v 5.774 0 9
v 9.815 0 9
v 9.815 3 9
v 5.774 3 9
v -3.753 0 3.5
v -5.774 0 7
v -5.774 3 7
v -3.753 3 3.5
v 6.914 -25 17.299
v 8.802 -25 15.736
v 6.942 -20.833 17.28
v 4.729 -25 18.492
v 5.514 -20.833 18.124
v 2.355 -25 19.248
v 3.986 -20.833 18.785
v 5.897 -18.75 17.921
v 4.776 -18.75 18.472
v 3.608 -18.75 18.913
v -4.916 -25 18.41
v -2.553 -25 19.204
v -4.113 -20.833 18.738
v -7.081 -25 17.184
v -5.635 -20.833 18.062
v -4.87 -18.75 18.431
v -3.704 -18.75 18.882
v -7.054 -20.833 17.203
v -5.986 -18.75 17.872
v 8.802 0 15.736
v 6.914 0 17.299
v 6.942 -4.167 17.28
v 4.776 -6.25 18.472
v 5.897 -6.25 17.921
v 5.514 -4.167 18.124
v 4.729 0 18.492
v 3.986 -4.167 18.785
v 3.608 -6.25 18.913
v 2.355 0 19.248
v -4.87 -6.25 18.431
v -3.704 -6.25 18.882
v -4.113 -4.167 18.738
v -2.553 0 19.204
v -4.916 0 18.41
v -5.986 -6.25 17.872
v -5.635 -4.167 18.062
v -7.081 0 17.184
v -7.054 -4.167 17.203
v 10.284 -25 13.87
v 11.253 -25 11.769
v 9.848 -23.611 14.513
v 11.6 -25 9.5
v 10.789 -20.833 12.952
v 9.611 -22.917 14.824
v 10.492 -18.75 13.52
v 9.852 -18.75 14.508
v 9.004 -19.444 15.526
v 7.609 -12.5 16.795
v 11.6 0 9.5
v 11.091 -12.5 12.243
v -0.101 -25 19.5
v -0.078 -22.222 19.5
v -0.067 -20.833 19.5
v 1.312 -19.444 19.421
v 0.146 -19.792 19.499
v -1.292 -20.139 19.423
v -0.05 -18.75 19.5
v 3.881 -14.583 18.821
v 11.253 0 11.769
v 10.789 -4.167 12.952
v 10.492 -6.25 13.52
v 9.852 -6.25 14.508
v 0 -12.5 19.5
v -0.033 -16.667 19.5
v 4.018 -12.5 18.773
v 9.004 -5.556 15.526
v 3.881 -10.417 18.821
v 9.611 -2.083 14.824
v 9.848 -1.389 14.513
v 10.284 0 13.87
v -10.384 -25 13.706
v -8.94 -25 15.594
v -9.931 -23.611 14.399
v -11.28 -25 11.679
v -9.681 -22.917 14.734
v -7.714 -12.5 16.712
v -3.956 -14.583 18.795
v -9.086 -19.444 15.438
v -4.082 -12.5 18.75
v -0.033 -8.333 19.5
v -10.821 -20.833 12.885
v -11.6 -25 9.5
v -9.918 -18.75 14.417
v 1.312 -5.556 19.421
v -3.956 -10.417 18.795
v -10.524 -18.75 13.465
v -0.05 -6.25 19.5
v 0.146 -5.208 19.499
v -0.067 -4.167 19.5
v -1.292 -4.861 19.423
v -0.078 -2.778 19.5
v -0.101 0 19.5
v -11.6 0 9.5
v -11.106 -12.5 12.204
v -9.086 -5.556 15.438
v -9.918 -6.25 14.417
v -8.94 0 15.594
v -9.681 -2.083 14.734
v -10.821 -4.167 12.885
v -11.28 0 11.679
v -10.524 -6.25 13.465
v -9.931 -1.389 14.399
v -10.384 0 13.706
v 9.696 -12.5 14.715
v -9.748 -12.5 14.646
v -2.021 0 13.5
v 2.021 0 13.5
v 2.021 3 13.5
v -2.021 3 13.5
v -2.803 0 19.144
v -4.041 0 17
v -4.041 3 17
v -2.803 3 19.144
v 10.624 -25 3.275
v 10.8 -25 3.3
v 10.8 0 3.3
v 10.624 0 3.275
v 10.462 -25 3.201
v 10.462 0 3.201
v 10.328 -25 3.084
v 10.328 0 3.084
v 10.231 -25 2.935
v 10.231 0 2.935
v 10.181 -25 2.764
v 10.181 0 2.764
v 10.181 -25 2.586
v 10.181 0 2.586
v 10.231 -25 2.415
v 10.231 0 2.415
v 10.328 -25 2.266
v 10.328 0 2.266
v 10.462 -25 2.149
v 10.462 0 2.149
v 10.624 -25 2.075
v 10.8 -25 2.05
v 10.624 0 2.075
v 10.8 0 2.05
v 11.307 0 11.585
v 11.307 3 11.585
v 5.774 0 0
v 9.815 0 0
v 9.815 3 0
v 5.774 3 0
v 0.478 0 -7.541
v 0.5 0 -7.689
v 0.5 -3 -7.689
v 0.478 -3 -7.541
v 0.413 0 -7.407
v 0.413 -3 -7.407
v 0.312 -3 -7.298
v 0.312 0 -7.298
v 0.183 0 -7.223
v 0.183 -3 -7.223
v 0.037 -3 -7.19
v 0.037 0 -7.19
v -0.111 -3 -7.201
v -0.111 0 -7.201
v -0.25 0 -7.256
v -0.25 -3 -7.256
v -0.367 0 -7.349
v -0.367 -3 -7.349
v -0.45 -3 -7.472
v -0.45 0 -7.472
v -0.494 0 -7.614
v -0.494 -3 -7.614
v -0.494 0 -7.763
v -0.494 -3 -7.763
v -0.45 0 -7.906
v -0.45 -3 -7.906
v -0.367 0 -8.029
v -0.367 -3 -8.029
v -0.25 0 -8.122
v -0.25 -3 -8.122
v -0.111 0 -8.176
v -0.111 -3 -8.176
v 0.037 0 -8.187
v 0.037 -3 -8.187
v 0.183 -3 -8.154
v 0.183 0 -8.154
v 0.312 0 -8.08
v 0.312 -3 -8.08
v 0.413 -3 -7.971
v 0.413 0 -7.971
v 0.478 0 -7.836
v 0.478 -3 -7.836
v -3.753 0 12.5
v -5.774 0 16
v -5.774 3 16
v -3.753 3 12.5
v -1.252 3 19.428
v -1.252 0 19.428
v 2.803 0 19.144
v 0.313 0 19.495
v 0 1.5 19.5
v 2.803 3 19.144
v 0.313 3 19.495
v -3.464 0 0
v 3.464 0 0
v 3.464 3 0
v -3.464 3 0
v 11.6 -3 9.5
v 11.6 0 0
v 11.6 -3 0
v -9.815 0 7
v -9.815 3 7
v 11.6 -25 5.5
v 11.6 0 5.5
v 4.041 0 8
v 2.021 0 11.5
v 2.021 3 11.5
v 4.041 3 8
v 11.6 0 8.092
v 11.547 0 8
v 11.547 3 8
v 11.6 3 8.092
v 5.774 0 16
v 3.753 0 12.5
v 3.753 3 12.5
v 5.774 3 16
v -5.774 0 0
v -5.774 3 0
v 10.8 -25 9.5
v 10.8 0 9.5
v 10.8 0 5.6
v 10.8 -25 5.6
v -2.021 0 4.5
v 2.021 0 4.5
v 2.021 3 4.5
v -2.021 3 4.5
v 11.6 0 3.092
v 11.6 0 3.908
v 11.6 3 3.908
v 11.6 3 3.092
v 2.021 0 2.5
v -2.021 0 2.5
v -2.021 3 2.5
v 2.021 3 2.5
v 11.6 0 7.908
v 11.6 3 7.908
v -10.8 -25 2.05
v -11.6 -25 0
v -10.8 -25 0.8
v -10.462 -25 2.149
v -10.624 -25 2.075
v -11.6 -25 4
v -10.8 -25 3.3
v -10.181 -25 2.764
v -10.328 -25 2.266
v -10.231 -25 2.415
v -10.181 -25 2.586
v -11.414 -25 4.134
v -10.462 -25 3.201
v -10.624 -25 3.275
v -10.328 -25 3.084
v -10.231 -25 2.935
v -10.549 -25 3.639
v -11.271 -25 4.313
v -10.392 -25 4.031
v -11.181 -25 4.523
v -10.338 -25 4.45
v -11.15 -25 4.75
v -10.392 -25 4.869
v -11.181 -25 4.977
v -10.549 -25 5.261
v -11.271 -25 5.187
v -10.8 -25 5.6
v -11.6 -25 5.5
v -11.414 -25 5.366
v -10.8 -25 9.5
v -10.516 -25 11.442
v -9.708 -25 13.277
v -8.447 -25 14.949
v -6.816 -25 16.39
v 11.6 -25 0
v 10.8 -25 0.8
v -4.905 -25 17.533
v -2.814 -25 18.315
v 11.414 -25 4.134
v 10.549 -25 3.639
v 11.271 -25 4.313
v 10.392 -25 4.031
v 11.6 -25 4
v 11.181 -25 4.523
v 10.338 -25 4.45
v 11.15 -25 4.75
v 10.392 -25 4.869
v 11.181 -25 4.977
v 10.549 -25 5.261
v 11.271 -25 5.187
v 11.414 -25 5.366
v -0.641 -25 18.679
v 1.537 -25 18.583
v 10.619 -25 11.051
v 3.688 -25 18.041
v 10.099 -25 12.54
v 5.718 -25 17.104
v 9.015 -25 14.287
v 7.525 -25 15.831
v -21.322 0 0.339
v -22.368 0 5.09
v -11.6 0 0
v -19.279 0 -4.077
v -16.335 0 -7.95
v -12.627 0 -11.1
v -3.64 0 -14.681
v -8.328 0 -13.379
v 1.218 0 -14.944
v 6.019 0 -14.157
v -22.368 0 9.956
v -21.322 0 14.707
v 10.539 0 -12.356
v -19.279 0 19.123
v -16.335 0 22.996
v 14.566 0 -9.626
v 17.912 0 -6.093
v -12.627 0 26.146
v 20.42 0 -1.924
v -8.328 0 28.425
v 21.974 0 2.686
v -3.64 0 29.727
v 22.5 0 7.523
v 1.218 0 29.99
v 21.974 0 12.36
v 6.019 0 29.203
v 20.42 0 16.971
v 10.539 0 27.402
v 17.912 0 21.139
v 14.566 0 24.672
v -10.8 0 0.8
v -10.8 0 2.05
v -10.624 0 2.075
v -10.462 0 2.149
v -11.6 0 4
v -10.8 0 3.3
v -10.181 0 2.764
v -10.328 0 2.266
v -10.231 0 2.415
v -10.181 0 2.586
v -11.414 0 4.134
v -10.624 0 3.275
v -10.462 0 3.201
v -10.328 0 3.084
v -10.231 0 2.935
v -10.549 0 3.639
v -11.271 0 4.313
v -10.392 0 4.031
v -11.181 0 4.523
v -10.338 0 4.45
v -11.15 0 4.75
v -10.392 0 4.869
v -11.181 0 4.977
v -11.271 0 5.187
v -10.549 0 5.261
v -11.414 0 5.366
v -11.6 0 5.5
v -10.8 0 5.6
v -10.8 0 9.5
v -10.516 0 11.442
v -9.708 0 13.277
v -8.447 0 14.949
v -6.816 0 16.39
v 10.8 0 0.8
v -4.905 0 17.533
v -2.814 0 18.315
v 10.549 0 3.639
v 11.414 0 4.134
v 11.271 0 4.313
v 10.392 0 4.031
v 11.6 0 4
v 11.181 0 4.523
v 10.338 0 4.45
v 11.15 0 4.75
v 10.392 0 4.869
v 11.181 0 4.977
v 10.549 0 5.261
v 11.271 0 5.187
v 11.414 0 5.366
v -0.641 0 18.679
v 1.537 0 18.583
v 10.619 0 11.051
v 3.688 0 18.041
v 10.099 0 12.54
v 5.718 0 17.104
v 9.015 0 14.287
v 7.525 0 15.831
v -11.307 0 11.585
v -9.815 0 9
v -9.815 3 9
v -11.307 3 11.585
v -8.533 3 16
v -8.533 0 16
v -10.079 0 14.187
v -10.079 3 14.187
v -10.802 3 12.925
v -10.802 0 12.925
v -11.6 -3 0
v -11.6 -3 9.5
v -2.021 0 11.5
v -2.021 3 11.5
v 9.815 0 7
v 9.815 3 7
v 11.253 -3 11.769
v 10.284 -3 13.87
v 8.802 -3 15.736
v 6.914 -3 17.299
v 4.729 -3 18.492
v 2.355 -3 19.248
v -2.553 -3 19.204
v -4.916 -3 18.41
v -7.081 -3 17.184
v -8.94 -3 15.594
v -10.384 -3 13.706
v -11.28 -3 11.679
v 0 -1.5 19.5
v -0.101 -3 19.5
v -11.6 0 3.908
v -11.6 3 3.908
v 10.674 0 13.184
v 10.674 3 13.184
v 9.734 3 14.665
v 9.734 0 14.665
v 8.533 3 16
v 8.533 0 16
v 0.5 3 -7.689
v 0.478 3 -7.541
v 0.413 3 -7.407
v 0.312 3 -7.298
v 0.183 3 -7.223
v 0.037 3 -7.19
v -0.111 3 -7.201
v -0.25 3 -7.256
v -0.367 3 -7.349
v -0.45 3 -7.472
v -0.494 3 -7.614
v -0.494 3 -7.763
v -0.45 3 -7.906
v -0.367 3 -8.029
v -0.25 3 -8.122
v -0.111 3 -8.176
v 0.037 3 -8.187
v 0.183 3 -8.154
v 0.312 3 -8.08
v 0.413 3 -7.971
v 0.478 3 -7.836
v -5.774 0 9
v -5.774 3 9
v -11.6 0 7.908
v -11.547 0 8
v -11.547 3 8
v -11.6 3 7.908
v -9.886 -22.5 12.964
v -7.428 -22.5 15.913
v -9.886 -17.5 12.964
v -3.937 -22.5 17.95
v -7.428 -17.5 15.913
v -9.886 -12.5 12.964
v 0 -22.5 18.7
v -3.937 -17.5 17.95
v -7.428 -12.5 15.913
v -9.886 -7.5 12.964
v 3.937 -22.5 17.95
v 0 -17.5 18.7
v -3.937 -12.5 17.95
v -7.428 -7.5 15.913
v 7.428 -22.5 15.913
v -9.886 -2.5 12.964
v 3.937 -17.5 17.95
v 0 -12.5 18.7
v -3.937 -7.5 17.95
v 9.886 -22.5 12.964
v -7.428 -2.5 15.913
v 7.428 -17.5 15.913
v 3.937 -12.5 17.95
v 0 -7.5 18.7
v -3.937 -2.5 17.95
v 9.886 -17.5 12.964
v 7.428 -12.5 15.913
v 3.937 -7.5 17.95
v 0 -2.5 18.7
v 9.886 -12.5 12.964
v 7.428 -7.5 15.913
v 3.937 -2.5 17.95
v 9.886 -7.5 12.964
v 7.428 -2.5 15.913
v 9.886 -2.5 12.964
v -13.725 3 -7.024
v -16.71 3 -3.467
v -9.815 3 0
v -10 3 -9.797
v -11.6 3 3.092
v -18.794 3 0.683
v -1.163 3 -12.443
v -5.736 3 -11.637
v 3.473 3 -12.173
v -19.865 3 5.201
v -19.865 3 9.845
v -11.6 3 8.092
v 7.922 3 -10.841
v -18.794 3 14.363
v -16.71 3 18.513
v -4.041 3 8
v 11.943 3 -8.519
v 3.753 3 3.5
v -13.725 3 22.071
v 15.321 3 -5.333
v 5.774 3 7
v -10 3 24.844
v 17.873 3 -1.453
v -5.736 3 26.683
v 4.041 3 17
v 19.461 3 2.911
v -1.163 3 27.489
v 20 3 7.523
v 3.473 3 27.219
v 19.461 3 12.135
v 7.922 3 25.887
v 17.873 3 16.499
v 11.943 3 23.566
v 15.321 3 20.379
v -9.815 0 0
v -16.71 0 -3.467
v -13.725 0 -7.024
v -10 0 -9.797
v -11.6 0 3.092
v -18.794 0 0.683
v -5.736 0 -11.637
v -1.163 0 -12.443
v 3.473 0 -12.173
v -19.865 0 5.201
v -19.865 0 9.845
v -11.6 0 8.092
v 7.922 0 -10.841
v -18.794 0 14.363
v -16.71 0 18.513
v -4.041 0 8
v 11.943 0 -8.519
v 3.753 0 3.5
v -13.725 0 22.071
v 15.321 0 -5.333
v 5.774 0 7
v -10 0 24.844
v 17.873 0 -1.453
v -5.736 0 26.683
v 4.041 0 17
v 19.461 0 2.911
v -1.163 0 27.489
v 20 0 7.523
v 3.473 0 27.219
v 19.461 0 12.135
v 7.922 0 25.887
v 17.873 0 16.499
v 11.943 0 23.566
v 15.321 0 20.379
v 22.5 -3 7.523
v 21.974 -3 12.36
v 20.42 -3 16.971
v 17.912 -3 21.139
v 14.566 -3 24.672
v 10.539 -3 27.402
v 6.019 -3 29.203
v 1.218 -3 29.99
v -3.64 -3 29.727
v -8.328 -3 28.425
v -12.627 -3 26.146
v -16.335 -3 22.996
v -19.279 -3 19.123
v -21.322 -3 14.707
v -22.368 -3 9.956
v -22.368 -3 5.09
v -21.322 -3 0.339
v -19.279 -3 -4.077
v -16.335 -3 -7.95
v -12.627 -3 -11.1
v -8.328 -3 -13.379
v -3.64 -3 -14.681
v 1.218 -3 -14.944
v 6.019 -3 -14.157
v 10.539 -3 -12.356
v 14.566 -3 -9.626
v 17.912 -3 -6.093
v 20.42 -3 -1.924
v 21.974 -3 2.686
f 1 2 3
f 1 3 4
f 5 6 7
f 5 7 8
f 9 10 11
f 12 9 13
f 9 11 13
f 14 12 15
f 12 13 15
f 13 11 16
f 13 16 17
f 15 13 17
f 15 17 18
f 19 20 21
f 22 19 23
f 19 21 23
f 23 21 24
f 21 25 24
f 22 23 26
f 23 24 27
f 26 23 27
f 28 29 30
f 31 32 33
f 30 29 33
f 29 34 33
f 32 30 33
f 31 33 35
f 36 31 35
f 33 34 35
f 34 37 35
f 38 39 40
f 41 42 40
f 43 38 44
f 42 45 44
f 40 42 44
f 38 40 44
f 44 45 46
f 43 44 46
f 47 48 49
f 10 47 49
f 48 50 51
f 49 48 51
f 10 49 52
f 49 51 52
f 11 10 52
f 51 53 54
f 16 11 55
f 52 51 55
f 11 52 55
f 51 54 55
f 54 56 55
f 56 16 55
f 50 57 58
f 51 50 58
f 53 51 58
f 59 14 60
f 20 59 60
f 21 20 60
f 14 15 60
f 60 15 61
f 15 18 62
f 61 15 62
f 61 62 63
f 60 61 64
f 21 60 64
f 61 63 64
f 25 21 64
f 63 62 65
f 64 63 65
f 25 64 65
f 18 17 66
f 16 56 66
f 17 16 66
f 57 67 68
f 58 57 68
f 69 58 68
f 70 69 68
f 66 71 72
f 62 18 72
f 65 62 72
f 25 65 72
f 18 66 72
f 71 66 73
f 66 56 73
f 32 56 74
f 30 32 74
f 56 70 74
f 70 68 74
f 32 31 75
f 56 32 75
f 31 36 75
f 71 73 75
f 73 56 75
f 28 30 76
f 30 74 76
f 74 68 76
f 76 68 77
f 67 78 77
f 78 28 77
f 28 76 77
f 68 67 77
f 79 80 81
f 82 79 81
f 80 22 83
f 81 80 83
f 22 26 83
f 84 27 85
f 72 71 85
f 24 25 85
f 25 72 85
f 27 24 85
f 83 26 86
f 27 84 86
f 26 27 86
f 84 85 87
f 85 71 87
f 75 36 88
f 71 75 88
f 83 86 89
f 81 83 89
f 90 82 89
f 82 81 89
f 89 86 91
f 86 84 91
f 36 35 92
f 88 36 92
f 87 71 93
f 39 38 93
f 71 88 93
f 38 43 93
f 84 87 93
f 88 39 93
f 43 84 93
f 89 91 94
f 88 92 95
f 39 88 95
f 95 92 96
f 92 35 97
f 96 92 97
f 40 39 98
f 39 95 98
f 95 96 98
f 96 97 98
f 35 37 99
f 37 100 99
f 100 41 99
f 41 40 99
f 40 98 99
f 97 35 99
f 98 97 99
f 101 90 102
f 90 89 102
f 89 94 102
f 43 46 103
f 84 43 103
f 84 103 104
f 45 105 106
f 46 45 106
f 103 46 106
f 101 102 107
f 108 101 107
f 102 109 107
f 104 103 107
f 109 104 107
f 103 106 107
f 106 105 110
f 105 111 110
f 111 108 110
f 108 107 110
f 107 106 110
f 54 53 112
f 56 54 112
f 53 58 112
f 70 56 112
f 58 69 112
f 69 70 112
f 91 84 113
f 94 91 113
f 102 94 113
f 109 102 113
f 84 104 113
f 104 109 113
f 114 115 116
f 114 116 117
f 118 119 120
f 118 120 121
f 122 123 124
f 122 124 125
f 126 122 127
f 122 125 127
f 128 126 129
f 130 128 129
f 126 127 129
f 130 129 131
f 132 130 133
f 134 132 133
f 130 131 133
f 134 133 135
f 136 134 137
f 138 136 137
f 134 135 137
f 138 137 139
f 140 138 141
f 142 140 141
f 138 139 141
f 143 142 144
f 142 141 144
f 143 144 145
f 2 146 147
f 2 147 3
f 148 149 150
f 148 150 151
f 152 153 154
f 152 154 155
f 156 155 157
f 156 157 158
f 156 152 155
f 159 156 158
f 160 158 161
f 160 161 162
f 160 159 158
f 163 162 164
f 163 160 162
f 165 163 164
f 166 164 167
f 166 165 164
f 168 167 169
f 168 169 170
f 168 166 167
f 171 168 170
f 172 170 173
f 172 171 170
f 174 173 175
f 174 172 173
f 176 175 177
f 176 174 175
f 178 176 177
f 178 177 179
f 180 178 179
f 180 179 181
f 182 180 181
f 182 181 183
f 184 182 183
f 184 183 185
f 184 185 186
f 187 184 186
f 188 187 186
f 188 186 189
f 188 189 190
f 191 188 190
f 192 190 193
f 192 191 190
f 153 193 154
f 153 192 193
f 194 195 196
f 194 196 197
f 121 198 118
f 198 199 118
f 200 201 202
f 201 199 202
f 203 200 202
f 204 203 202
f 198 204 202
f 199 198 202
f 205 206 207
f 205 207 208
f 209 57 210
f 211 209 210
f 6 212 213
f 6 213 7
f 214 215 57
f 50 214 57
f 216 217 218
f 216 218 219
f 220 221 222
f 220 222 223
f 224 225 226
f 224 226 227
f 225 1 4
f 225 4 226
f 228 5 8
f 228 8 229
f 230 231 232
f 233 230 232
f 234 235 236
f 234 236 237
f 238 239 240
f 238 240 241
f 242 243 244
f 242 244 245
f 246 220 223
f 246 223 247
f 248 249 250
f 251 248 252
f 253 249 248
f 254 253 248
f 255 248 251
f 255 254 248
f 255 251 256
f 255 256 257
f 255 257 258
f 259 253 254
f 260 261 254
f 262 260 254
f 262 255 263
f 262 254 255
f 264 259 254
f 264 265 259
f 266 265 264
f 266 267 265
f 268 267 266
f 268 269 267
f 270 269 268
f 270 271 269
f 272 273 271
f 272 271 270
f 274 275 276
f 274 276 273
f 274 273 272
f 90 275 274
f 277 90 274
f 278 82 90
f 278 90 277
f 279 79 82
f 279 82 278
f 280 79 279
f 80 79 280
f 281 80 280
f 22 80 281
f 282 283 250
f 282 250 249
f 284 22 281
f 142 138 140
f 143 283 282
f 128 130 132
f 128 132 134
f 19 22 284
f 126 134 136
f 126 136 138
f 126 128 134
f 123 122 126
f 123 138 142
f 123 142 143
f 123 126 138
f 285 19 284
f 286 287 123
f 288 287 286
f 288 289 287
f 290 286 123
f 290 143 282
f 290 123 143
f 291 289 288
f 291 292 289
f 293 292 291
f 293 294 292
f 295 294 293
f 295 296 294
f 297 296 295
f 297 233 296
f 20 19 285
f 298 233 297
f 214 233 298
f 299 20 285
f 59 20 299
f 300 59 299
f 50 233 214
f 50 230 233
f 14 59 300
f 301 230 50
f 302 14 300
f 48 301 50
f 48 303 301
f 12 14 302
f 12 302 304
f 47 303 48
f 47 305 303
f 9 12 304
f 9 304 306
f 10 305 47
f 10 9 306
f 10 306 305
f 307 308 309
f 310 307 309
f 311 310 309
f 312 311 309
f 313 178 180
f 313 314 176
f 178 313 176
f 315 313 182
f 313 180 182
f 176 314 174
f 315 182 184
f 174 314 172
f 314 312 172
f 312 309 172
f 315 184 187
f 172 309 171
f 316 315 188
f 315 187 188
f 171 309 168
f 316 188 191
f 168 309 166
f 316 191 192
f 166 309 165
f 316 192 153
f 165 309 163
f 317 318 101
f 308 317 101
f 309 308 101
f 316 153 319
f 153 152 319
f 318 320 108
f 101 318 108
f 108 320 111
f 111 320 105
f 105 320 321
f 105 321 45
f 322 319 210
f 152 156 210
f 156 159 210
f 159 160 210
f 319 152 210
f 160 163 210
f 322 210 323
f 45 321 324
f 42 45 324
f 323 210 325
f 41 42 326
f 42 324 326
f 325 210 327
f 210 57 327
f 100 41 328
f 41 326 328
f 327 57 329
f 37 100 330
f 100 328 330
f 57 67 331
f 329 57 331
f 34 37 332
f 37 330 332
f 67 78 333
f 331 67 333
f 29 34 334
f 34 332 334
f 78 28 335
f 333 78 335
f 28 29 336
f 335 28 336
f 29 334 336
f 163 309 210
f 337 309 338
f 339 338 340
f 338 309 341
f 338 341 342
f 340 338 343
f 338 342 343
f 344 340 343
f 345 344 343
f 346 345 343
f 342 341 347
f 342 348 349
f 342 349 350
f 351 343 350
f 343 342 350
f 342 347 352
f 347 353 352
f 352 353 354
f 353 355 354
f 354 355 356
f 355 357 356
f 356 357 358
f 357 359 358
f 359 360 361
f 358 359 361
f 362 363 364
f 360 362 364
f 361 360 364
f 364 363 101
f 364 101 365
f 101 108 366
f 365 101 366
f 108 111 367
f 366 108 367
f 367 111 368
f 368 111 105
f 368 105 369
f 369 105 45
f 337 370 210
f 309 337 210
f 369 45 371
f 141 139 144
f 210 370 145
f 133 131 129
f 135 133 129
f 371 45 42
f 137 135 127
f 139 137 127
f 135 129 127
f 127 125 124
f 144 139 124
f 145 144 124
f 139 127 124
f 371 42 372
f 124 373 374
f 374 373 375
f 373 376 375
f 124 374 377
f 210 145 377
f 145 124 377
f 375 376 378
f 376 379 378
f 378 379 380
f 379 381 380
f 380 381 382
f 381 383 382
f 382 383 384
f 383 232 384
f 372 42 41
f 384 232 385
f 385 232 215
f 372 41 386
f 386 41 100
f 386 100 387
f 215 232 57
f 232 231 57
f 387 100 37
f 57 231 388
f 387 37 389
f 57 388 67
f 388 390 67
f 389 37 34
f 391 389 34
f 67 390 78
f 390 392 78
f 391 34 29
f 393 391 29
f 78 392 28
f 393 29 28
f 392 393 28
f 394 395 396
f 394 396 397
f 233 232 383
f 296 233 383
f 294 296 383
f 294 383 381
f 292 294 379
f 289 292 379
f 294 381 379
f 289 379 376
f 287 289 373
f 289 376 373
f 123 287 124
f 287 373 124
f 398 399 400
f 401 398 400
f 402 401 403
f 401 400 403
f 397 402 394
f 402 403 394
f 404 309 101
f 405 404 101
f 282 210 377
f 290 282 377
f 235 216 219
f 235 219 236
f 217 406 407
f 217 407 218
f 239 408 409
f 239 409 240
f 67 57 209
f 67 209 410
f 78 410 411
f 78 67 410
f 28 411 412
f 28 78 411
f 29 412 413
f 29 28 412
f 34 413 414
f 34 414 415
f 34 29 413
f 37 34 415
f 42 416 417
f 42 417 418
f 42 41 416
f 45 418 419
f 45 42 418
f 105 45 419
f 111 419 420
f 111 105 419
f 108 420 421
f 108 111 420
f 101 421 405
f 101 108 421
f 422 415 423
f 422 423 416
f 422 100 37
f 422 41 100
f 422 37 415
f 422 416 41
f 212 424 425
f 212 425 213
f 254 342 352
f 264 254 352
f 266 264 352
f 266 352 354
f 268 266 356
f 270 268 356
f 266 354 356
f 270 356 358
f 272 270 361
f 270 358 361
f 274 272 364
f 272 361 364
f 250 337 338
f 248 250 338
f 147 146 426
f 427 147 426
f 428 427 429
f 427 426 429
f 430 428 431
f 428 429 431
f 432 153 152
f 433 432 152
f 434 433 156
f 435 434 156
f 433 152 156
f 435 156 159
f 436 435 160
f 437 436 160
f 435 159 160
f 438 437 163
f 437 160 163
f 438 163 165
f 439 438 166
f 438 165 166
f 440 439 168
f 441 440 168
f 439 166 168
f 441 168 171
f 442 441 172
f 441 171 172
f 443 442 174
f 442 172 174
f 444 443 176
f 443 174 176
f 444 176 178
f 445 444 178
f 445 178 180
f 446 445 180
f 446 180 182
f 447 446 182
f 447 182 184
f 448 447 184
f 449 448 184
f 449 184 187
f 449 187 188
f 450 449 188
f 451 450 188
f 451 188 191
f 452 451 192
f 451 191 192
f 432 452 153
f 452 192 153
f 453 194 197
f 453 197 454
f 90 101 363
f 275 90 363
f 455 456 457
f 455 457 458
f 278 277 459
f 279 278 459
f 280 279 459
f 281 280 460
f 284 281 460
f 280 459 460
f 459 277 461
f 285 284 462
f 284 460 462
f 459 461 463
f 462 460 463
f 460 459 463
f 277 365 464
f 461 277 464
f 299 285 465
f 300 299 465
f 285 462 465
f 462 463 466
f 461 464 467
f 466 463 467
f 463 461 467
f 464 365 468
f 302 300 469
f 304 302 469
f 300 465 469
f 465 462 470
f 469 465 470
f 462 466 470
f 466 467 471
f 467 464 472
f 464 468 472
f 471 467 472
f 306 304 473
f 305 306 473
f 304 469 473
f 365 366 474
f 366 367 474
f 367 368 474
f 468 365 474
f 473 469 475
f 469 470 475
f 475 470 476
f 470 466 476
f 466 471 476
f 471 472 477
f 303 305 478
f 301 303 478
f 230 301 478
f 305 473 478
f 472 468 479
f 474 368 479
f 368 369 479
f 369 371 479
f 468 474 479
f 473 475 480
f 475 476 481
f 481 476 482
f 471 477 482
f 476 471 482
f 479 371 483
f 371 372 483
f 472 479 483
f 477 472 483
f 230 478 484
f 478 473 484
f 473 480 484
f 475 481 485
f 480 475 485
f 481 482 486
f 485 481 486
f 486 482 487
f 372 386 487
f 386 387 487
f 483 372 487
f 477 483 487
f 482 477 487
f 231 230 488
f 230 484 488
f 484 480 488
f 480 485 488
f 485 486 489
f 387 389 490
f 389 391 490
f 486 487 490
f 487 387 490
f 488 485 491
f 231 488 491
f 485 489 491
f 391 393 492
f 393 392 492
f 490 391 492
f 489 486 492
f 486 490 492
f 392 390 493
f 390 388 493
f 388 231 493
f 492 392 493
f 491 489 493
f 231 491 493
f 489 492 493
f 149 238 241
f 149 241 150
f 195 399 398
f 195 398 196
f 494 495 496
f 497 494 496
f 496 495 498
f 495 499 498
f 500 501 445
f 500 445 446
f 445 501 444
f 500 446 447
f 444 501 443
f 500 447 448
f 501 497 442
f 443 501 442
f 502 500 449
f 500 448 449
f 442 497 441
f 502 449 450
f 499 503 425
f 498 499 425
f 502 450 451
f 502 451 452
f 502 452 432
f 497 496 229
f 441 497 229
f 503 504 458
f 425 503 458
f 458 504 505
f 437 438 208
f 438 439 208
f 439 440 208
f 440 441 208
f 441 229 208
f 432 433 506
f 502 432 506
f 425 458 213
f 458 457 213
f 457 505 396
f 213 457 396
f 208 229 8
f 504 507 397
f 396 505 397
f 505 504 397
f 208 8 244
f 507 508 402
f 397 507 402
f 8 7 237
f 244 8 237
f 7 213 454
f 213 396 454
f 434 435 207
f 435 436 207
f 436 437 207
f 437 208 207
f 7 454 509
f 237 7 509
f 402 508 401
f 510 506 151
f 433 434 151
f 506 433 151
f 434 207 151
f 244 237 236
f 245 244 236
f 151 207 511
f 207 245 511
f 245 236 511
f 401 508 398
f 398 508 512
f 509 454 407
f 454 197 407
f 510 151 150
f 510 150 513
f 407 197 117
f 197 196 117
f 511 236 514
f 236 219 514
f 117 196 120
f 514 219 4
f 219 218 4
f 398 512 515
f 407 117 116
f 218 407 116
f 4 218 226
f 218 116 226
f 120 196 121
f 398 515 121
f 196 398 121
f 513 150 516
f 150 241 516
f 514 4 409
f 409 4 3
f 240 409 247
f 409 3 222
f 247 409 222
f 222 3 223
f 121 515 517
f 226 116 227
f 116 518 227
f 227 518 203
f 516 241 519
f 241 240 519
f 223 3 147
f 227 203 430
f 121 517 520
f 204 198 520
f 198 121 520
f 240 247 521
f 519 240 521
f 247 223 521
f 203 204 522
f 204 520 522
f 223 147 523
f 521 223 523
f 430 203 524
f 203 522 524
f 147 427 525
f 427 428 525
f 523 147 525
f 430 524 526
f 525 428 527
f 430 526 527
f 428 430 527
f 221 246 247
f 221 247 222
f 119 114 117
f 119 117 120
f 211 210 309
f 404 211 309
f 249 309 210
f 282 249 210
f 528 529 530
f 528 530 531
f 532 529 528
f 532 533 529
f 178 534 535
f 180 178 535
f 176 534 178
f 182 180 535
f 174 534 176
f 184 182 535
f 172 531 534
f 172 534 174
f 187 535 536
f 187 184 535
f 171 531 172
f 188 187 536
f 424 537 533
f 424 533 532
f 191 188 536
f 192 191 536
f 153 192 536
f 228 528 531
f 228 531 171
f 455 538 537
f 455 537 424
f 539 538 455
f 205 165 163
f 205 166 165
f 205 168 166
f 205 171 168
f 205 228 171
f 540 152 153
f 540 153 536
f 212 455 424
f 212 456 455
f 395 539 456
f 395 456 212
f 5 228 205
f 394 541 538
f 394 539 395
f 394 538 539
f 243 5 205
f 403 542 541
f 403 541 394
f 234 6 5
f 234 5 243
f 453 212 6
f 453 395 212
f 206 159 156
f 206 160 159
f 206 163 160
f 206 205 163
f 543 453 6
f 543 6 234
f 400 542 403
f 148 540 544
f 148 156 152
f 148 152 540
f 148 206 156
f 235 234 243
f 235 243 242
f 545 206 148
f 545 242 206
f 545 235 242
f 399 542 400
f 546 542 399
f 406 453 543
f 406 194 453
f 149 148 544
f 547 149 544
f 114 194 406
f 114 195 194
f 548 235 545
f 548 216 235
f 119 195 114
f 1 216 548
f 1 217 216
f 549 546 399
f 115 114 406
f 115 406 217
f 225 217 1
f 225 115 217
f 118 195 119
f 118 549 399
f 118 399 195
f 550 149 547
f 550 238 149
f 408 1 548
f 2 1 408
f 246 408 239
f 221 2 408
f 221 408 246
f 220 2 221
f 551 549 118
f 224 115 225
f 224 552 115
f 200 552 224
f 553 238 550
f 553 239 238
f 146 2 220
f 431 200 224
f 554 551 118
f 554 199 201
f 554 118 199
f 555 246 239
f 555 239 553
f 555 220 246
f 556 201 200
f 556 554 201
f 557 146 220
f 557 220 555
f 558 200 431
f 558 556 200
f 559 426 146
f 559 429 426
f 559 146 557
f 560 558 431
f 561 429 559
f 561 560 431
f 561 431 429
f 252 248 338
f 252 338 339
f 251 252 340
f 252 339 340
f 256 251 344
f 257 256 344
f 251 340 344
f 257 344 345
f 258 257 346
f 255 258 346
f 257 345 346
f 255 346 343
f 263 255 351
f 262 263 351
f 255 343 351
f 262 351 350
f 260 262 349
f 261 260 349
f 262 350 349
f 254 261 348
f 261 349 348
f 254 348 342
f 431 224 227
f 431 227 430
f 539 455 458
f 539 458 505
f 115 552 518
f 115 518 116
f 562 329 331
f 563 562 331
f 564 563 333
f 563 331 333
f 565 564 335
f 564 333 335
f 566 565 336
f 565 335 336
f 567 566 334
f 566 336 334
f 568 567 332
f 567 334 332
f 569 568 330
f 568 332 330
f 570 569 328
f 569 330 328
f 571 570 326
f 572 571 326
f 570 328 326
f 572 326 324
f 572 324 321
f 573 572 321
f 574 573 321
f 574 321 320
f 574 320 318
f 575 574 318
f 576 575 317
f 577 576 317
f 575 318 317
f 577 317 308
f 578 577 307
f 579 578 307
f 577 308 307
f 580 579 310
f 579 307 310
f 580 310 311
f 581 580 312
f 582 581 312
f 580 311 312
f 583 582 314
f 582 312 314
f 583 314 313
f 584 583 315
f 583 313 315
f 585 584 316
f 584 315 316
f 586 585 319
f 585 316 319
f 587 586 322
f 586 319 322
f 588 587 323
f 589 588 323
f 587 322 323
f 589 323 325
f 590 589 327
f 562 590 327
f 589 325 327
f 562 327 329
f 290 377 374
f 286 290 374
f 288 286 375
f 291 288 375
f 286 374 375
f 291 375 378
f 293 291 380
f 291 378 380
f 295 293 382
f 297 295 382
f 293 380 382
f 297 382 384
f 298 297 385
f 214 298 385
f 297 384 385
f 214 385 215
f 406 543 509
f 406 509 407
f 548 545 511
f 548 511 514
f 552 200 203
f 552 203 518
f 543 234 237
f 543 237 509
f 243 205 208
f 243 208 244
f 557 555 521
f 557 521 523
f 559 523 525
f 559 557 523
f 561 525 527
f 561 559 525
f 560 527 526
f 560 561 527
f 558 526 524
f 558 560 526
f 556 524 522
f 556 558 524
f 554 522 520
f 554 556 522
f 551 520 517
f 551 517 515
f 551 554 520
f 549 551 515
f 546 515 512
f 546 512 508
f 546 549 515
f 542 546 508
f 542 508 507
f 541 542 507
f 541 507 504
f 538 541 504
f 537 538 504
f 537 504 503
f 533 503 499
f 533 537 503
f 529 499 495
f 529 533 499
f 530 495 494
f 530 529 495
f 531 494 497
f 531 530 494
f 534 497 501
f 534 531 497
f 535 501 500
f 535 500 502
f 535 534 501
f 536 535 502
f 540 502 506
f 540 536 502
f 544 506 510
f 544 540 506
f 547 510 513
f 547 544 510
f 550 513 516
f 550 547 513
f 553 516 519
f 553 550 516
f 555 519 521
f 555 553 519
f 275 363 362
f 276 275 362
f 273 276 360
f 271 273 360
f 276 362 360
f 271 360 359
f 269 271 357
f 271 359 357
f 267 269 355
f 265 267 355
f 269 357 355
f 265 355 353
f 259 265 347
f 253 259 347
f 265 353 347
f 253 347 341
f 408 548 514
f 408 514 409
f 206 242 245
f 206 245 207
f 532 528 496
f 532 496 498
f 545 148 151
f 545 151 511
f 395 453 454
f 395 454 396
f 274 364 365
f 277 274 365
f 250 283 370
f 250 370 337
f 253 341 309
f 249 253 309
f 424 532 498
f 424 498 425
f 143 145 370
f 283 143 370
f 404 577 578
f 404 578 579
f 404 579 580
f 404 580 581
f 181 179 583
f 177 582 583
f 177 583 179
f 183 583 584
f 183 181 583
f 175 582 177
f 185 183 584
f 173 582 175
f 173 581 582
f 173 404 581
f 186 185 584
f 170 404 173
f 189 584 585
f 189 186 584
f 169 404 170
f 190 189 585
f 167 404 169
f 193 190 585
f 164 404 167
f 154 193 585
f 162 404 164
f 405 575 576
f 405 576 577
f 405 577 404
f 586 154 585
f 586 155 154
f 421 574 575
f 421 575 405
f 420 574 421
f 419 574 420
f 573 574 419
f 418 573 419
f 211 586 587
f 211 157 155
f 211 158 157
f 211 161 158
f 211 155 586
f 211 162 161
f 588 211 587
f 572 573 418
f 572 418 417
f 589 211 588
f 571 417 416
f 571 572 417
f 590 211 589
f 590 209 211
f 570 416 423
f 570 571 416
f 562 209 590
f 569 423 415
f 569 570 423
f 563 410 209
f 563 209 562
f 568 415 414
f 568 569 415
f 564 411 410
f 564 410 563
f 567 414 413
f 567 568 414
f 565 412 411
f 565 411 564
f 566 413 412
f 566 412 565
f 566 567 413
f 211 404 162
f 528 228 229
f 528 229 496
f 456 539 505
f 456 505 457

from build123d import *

# Parameters (mm, degrees)
F1_DEPTH = 25
F2_R     = 22.5
F2_R_2   = 20
F2_R_3   = 0.5
F3_DEPTH = 3
F5_DEPTH = 3


# Not quite as in the source:
# - the dataset's text gives a spline's control points without its knots; the knots are read off the source's solid
# - a feature names something its author has since deleted; it is built from what else it names


with BuildPart() as f1:
    # F0 (on Front) → F1 (new body)
    with BuildSketch(Plane.XZ):
        with BuildLine():
            Line((-11.6, 4), (-11.6, 0))
            Line((-11.6, 0), (11.6, 0))
            Line((11.6, 0), (11.6, 4))
            ThreePointArc((11.6, 4), (11.15, 4.75), (11.6, 5.5))
            Line((11.6, 5.5), (11.6, 9.5))
            add(Edge.make_bspline(
                [(11.6, 9.5), (11.6, 14.9057612107), (5.7087616122, 19.5), (0, 19.5)],
                knots=[0, 0, 0, 0, 15.3153517753, 15.3153517753, 15.3153517753, 15.3153517753], degree=3))
            add(Edge.make_bspline(
                [(-11.6, 9.5), (-11.6, 14.9057612107), (-5.7087616122, 19.5), (0, 19.5)],
                knots=[0, 0, 0, 0, 15.3153517753, 15.3153517753, 15.3153517753, 15.3153517753], degree=3))
            Line((-11.6, 9.5), (-11.6, 5.5))
            ThreePointArc((-11.6, 5.5), (-11.15, 4.75), (-11.6, 4))
        make_face()
        with BuildLine():
            Line((10.8, 0.8), (0, 0.8))
            Line((0, 0.8), (-10.8, 0.8))
            Line((-10.8, 0.8), (-10.8, 2.05))
            ThreePointArc((-10.8, 2.05), (-10.175, 2.675), (-10.8, 3.3))
            ThreePointArc((-10.8, 3.3), (-10.3379229861, 4.45), (-10.8, 5.6))
            Line((-10.8, 5.6), (-10.8, 9.5))
            add(Edge.make_bspline(
                [(-10.8, 9.5), (-10.8, 10.1030663269), (-10.6361560663, 11.2884100286), (-9.7228728088, 13.5496398504), (-7.603062861, 16.0660942728), (-4.0104787703, 18.1666619497), (-1.3198877666, 18.7), (0, 18.7)],
                knots=[0, 0, 0, 0, 0.125, 0.25, 0.5, 0.75, 1, 1, 1, 1], degree=3))
            add(Edge.make_bspline(
                [(10.8, 9.5), (10.8, 10.1030663269), (10.6361560663, 11.2884100286), (9.7228728088, 13.5496398504), (7.603062861, 16.0660942728), (4.0104787703, 18.1666619497), (1.3198877666, 18.7), (0, 18.7)],
                knots=[0, 0, 0, 0, 0.125, 0.25, 0.5, 0.75, 1, 1, 1, 1], degree=3))
            Line((10.8, 9.5), (10.8, 5.6))
            ThreePointArc((10.8, 5.6), (10.3379229861, 4.45), (10.8, 3.3))
            ThreePointArc((10.8, 3.3), (10.175, 2.675), (10.8, 2.05))
            Line((10.8, 2.05), (10.8, 0.8))
        make_face(mode=Mode.SUBTRACT)
    extrude(amount=F1_DEPTH)


with BuildPart() as f3:
    # F2 (on Front) → F3 (new body)
    with BuildSketch(Plane.XZ):
        with Locations((0, 7.5230388902)):
            Circle(F2_R)
        with Locations((0, 7.5230388902)):
            Circle(F2_R_2, mode=Mode.SUBTRACT)
        with Locations((0, 7.5230388902)):
            Circle(F2_R_2)
        with Locations((0, -7.6888706521)):
            Circle(F2_R_3, mode=Mode.SUBTRACT)
        with BuildLine():
            add(Edge.make_bspline(
                [(0, 19.5), (-5.7087616122, 19.5), (-11.6, 14.9057612107), (-11.6, 9.5)],
                knots=[0, 0, 0, 0, 1, 1, 1, 1], degree=3))
            add(Edge.make_bspline(
                [(11.6, 9.5), (11.6, 14.9057612107), (5.7087616122, 19.5), (0, 19.5)],
                knots=[0, 0, 0, 0, 1, 1, 1, 1], degree=3))
            Line((11.6, 9.5), (11.6, 5.5))
            Line((11.6, 5.5), (11.6, 4))
            Line((11.6, 4), (11.6, 0))
            Line((11.6, 0), (-11.6, 0))
            Line((-11.6, 0), (-11.6, 4))
            Line((-11.6, 4), (-11.6, 5.5))
            Line((-11.6, 5.5), (-11.6, 9.5))
        make_face(mode=Mode.SUBTRACT)
    extrude(amount=F3_DEPTH)


with BuildPart() as f5:
    # F4 (on Front) → F5 (new body)
    with BuildSketch(Plane.XZ):
        with BuildLine():
            Line((-11.6, 9.5), (-11.6, 8.0917893678))
            Line((-11.6, 8.0917893678), (-11.5470053838, 8))
            Line((-11.5470053838, 8), (-11.6, 7.9082106322))
            Line((-11.6, 7.9082106322), (-11.6, 3.9082106322))
            Line((-11.6, 3.9082106322), (-9.8149545762, 7))
            Line((-9.8149545762, 7), (-5.7735026919, 7))
            Line((-5.7735026919, 7), (-3.7527767497, 3.5))
            Line((-3.7527767497, 3.5), (-5.7735026919, 0))
            Line((-5.7735026919, 0), (-3.4641016151, 0))
            Line((-3.4641016151, 0), (-2.0207259422, 2.5))
            Line((-2.0207259422, 2.5), (2.0207259422, 2.5))
            Line((2.0207259422, 2.5), (3.4641016151, 0))
            Line((3.4641016151, 0), (5.7735026919, 0))
            Line((5.7735026919, 0), (3.7527767497, 3.5))
            Line((3.7527767497, 3.5), (5.7735026919, 7))
            Line((5.7735026919, 7), (9.8149545762, 7))
            Line((9.8149545762, 7), (11.6, 3.9082106322))
            Line((11.6, 3.9082106322), (11.6, 7.9082106322))
            Line((11.6, 7.9082106322), (11.5470053838, 8))
            Line((11.5470053838, 8), (11.6, 8.0917893678))
            Line((11.6, 8.0917893678), (11.6, 9.5))
            add(Edge.make_bspline(
                [(11.6, 9.5), (11.6, 10.2119185774), (11.4978229092, 10.9097621854), (11.3073418694, 11.5848906163)],
                knots=[0, 0, 0, 0, 0.1316962681, 0.1316962681, 0.1316962681, 0.1316962681], degree=3))
            Line((11.3073418694, 11.5848906163), (9.8149545762, 9))
            Line((9.8149545762, 9), (5.7735026919, 9))
            Line((5.7735026919, 9), (3.7527767497, 12.5))
            Line((3.7527767497, 12.5), (5.7735026919, 16))
            Line((5.7735026919, 16), (8.5327536542, 16))
            add(Edge.make_bspline(
                [(8.5327536542, 16), (6.9682227077, 17.4875332287), (4.9454375756, 18.606013275), (2.8034534401, 19.1442762052)],
                knots=[0.453411459, 0.453411459, 0.453411459, 0.453411459, 0.8355950075, 0.8355950075, 0.8355950075, 0.8355950075], degree=3))
            Line((2.8034534401, 19.1442762052), (4.0414518843, 17))
            Line((4.0414518843, 17), (2.0207259422, 13.5))
            Line((2.0207259422, 13.5), (-2.0207259422, 13.5))
            Line((-2.0207259422, 13.5), (-4.0414518843, 17))
            Line((-4.0414518843, 17), (-2.8034534401, 19.1442762052))
            add(Edge.make_bspline(
                [(-2.8034534401, 19.1442762052), (-4.9454375756, 18.606013275), (-6.9682227077, 17.4875332287), (-8.5327536542, 16)],
                knots=[0.1644049925, 0.1644049925, 0.1644049925, 0.1644049925, 0.546588541, 0.546588541, 0.546588541, 0.546588541], degree=3))
            Line((-8.5327536542, 16), (-5.7735026919, 16))
            Line((-5.7735026919, 16), (-3.7527767497, 12.5))
            Line((-3.7527767497, 12.5), (-5.7735026919, 9))
            Line((-5.7735026919, 9), (-9.8149545762, 9))
            Line((-9.8149545762, 9), (-11.3073418694, 11.5848906163))
            add(Edge.make_bspline(
                [(-11.3073418694, 11.5848906163), (-11.4978229092, 10.9097621854), (-11.6, 10.2119185774), (-11.6, 9.5)],
                knots=[0.8683037319, 0.8683037319, 0.8683037319, 0.8683037319, 1, 1, 1, 1], degree=3))
        make_face()
        Polygon((-2.0207259422, 11.5), (2.0207259422, 11.5), (4.0414518843, 8), (2.0207259422, 4.5), (-2.0207259422, 4.5), (-4.0414518843, 8), align=None, mode=Mode.SUBTRACT)
    extrude(amount=-F5_DEPTH)



with BuildPart() as f5b:
    # F4 (on Front) → F5, piece 2 (new body)
    with BuildSketch(Plane.XZ):
        Polygon((11.6, 3.0917893678), (9.8149545762, 0), (11.6, 0), align=None)
    extrude(amount=-F5_DEPTH)


with BuildPart() as f5c:
    # F4 (on Front) → F5, piece 3 (new body)
    with BuildSketch(Plane.XZ):
        Polygon((-9.8149545762, 0), (-11.6, 3.0917893678), (-11.6, 0), align=None)
    extrude(amount=-F5_DEPTH)


with BuildPart() as f5_1:
    add(f5.part)

    add(f5b.part)  # F5#4 merges F5b

    add(f5c.part)  # F5#4 merges F5c
    # F2 (on Front) → F5, piece 4 (join)
    with BuildSketch(Plane.XZ):
        with Locations((0, 7.5230388902)):
            Circle(F2_R_2)
        with Locations((0, -7.6888706521)):
            Circle(F2_R_3, mode=Mode.SUBTRACT)
        with BuildLine():
            add(Edge.make_bspline(
                [(0, 19.5), (-5.7087616122, 19.5), (-11.6, 14.9057612107), (-11.6, 9.5)],
                knots=[0, 0, 0, 0, 1, 1, 1, 1], degree=3))
            add(Edge.make_bspline(
                [(11.6, 9.5), (11.6, 14.9057612107), (5.7087616122, 19.5), (0, 19.5)],
                knots=[0, 0, 0, 0, 1, 1, 1, 1], degree=3))
            Line((11.6, 9.5), (11.6, 5.5))
            Line((11.6, 5.5), (11.6, 4))
            Line((11.6, 4), (11.6, 0))
            Line((11.6, 0), (-11.6, 0))
            Line((-11.6, 0), (-11.6, 4))
            Line((-11.6, 4), (-11.6, 5.5))
            Line((-11.6, 5.5), (-11.6, 9.5))
        make_face(mode=Mode.SUBTRACT)
    extrude(amount=-F5_DEPTH)


solid = Compound([f1.part, f3.part, f5_1.part])
